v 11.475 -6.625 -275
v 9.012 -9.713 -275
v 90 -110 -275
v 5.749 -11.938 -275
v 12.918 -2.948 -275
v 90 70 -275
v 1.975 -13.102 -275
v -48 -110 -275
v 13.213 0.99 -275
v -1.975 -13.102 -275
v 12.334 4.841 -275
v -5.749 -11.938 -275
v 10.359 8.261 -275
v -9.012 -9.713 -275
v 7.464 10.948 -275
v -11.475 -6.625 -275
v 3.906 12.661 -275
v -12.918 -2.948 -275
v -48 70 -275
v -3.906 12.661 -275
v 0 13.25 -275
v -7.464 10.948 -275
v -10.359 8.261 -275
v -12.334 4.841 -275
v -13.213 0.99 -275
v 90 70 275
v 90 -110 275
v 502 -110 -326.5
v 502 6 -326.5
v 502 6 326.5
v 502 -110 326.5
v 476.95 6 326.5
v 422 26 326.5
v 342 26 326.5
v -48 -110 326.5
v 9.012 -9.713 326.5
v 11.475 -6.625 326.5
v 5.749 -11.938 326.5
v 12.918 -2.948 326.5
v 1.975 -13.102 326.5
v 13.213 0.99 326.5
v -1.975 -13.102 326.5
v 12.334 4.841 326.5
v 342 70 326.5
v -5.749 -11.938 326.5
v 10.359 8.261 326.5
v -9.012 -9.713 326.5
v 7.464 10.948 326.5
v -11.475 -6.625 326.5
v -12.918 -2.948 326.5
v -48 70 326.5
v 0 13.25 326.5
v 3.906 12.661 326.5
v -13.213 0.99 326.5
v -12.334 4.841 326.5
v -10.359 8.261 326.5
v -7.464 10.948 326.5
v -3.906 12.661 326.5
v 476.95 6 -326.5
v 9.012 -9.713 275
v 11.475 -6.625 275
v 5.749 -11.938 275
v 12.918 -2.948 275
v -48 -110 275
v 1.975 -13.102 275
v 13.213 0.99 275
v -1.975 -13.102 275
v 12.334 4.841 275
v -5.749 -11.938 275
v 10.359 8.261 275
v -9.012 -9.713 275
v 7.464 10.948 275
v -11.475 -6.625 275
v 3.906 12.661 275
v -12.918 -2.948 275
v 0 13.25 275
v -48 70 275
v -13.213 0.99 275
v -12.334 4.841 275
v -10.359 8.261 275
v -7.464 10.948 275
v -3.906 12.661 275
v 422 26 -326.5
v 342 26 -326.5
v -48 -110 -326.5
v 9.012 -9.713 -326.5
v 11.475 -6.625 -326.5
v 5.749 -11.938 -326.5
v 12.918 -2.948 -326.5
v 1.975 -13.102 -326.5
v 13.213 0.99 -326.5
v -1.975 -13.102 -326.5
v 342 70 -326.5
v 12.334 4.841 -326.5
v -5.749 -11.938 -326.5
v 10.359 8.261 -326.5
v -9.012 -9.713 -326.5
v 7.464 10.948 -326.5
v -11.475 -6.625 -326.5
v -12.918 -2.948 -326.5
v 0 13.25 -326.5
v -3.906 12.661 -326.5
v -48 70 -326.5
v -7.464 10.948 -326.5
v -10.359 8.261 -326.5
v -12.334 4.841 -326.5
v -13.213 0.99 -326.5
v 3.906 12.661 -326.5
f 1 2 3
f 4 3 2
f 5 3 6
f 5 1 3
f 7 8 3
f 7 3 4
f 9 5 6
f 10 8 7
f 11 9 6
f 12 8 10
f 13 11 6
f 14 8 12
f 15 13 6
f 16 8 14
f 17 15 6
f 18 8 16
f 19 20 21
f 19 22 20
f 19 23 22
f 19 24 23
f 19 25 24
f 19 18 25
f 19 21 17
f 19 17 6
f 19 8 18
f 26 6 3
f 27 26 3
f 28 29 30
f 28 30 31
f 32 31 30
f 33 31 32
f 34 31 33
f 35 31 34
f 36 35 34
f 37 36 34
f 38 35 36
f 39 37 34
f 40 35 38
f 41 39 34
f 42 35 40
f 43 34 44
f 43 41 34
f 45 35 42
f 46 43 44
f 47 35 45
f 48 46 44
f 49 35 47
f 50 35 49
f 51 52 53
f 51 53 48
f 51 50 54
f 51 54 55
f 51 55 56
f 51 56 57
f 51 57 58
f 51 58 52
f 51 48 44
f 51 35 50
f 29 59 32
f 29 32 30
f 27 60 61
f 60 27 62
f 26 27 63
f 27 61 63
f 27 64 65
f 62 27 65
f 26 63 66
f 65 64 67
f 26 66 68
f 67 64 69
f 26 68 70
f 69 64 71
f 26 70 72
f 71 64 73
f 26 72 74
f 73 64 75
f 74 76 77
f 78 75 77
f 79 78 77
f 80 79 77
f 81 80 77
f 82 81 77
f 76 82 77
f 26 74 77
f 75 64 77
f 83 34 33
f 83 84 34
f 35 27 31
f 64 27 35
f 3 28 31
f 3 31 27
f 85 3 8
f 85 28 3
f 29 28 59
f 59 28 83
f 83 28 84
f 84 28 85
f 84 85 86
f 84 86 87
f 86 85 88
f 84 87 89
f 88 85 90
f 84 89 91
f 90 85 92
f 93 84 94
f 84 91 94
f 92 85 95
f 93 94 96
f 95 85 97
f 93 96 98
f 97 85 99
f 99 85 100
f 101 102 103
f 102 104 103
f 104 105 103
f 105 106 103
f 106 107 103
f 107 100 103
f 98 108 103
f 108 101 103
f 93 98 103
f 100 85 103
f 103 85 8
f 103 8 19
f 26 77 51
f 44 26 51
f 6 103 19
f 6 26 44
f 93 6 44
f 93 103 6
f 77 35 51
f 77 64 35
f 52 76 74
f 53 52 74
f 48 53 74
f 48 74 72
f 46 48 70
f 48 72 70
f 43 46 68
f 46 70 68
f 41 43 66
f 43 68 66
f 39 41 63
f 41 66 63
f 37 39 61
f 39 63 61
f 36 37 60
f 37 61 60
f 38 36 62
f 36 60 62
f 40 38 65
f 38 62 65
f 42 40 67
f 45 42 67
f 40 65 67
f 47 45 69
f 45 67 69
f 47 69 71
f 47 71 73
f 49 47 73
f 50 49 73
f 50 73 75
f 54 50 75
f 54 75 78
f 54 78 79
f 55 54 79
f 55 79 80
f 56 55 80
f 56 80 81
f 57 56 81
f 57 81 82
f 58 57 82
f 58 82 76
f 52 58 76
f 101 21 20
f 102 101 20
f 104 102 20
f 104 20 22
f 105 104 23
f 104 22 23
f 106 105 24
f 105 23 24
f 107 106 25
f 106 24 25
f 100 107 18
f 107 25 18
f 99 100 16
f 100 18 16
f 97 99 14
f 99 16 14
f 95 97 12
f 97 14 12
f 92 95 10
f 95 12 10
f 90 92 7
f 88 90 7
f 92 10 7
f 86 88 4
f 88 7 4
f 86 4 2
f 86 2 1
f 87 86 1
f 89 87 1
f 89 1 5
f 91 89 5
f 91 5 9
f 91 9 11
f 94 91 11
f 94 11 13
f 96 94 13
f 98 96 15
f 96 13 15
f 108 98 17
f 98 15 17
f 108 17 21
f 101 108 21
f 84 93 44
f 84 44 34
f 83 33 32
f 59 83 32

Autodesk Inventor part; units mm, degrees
ref_plane "YZ Plane" through (0, 0, 0) normal (1, 0, 0) x (0, 1, 0)
ref_plane "XZ Plane" through (0, 0, 0) normal (0, 1, 0) x (-1, 0, 0)
ref_plane "XY Plane" through (0, 0, 0) normal (0, 0, 1) x (1, 0, 0)
sketch "草圖1" plane through (0, 0, 0) normal (0, 0, 1) x (0, 1, 0)
  line L0 (-110, 48) -> (70, 48)
  line L1 (70, 48) -> (70, -502)
  line L2 (70, -502) -> (-110, -502)
  line L3 (-110, -502) -> (-110, 48)
  line L4 (70, -342) -> (26, -342)
  line L5 (26, -342) -> (26, -422)
  line L6 (26, -422) -> (6, -476.9495)
  line L7 (6, -476.9495) -> (6, -502)
  point P0 (0, 0)
  dimension "d0" = 110
  dimension "d1" = 48
  dimension "d2" = 180
  dimension "d3" = 550
  dimension "d10" = 136
  dimension "d11" = 20
  dimension "d12" = 20
  dimension "d13" = 80
  dimension "d19" = 160
extrude "擠出1" add sketch "草圖1" along normal mid plane 653 contours L0 L1 L4 L5 L6 L7 L2 L3
sketch "草圖2" plane through (0, 0, 0) normal (0, 0, 1) x (0, 1, 0)
  line L0 (70, -90) -> (-110, -90)
  line L1 (-110, 48) -> (70, 48) projected
  line L2 (70, 48) -> (70, -342) projected
  line L3 (6, -502) -> (-110, -502) projected
  line L4 (-110, -502) -> (-110, 48) projected
  line L5 (70, -103.9214) -> (70, -178.9214)
  line L6 (70, -342) -> (26, -342) projected
  line L7 (26, -342) -> (26, -422) projected
  line L8 (26, -422) -> (6, -476.9495) projected
  line L9 (6, -476.9495) -> (6, -502) projected
  point P0 (0, 0)
  dimension "d6" = 90
extrude "擠出2" cut sketch "草圖2" along normal mid plane 550 contours L0 L4 L1 L2
sketch "草圖3" plane through (0, 0, 0) normal (0, 0, 1) x (0, 1, 0)
  circle A0 centre (0, 0) radius 13.25
  dimension "d4" = 653
  dimension "d14" = 26.5
extrude "擠出3" cut sketch "草圖3" along normal through all both and the other way through all
equation "\"d7\" = Width"
equation "\"th6\" = T1A_th6"
equation "\"Width\" = T1A_R6_Width"
equation "\"T1A_th6\" = 45deg"
equation "\"T1A_R1\" = 585.5331"
equation "\"T1A_R3\" = 252.3048"
equation "\"T1A_R4\" = 320.6953"
equation "\"T1A_R5\" = 419.3047"
equation "\"T1A_R7\" = -221.7475"
equation "\"T1A_R8\" = 369.2781"
equation "\"T1A_R1_Width\" = 756"
equation "\"T1A_R2_Width\" = 756"
equation "\"T1A_R3_Width\" = 344"
equation "\"T1A_R4_Width\" = 756"
equation "\"T1A_Joint_Width\" = 756"
equation "\"T1A_R6_Width\" = 550"
properties part number "Type 1A R6主滑台:1" material "密度7850的鋼"
